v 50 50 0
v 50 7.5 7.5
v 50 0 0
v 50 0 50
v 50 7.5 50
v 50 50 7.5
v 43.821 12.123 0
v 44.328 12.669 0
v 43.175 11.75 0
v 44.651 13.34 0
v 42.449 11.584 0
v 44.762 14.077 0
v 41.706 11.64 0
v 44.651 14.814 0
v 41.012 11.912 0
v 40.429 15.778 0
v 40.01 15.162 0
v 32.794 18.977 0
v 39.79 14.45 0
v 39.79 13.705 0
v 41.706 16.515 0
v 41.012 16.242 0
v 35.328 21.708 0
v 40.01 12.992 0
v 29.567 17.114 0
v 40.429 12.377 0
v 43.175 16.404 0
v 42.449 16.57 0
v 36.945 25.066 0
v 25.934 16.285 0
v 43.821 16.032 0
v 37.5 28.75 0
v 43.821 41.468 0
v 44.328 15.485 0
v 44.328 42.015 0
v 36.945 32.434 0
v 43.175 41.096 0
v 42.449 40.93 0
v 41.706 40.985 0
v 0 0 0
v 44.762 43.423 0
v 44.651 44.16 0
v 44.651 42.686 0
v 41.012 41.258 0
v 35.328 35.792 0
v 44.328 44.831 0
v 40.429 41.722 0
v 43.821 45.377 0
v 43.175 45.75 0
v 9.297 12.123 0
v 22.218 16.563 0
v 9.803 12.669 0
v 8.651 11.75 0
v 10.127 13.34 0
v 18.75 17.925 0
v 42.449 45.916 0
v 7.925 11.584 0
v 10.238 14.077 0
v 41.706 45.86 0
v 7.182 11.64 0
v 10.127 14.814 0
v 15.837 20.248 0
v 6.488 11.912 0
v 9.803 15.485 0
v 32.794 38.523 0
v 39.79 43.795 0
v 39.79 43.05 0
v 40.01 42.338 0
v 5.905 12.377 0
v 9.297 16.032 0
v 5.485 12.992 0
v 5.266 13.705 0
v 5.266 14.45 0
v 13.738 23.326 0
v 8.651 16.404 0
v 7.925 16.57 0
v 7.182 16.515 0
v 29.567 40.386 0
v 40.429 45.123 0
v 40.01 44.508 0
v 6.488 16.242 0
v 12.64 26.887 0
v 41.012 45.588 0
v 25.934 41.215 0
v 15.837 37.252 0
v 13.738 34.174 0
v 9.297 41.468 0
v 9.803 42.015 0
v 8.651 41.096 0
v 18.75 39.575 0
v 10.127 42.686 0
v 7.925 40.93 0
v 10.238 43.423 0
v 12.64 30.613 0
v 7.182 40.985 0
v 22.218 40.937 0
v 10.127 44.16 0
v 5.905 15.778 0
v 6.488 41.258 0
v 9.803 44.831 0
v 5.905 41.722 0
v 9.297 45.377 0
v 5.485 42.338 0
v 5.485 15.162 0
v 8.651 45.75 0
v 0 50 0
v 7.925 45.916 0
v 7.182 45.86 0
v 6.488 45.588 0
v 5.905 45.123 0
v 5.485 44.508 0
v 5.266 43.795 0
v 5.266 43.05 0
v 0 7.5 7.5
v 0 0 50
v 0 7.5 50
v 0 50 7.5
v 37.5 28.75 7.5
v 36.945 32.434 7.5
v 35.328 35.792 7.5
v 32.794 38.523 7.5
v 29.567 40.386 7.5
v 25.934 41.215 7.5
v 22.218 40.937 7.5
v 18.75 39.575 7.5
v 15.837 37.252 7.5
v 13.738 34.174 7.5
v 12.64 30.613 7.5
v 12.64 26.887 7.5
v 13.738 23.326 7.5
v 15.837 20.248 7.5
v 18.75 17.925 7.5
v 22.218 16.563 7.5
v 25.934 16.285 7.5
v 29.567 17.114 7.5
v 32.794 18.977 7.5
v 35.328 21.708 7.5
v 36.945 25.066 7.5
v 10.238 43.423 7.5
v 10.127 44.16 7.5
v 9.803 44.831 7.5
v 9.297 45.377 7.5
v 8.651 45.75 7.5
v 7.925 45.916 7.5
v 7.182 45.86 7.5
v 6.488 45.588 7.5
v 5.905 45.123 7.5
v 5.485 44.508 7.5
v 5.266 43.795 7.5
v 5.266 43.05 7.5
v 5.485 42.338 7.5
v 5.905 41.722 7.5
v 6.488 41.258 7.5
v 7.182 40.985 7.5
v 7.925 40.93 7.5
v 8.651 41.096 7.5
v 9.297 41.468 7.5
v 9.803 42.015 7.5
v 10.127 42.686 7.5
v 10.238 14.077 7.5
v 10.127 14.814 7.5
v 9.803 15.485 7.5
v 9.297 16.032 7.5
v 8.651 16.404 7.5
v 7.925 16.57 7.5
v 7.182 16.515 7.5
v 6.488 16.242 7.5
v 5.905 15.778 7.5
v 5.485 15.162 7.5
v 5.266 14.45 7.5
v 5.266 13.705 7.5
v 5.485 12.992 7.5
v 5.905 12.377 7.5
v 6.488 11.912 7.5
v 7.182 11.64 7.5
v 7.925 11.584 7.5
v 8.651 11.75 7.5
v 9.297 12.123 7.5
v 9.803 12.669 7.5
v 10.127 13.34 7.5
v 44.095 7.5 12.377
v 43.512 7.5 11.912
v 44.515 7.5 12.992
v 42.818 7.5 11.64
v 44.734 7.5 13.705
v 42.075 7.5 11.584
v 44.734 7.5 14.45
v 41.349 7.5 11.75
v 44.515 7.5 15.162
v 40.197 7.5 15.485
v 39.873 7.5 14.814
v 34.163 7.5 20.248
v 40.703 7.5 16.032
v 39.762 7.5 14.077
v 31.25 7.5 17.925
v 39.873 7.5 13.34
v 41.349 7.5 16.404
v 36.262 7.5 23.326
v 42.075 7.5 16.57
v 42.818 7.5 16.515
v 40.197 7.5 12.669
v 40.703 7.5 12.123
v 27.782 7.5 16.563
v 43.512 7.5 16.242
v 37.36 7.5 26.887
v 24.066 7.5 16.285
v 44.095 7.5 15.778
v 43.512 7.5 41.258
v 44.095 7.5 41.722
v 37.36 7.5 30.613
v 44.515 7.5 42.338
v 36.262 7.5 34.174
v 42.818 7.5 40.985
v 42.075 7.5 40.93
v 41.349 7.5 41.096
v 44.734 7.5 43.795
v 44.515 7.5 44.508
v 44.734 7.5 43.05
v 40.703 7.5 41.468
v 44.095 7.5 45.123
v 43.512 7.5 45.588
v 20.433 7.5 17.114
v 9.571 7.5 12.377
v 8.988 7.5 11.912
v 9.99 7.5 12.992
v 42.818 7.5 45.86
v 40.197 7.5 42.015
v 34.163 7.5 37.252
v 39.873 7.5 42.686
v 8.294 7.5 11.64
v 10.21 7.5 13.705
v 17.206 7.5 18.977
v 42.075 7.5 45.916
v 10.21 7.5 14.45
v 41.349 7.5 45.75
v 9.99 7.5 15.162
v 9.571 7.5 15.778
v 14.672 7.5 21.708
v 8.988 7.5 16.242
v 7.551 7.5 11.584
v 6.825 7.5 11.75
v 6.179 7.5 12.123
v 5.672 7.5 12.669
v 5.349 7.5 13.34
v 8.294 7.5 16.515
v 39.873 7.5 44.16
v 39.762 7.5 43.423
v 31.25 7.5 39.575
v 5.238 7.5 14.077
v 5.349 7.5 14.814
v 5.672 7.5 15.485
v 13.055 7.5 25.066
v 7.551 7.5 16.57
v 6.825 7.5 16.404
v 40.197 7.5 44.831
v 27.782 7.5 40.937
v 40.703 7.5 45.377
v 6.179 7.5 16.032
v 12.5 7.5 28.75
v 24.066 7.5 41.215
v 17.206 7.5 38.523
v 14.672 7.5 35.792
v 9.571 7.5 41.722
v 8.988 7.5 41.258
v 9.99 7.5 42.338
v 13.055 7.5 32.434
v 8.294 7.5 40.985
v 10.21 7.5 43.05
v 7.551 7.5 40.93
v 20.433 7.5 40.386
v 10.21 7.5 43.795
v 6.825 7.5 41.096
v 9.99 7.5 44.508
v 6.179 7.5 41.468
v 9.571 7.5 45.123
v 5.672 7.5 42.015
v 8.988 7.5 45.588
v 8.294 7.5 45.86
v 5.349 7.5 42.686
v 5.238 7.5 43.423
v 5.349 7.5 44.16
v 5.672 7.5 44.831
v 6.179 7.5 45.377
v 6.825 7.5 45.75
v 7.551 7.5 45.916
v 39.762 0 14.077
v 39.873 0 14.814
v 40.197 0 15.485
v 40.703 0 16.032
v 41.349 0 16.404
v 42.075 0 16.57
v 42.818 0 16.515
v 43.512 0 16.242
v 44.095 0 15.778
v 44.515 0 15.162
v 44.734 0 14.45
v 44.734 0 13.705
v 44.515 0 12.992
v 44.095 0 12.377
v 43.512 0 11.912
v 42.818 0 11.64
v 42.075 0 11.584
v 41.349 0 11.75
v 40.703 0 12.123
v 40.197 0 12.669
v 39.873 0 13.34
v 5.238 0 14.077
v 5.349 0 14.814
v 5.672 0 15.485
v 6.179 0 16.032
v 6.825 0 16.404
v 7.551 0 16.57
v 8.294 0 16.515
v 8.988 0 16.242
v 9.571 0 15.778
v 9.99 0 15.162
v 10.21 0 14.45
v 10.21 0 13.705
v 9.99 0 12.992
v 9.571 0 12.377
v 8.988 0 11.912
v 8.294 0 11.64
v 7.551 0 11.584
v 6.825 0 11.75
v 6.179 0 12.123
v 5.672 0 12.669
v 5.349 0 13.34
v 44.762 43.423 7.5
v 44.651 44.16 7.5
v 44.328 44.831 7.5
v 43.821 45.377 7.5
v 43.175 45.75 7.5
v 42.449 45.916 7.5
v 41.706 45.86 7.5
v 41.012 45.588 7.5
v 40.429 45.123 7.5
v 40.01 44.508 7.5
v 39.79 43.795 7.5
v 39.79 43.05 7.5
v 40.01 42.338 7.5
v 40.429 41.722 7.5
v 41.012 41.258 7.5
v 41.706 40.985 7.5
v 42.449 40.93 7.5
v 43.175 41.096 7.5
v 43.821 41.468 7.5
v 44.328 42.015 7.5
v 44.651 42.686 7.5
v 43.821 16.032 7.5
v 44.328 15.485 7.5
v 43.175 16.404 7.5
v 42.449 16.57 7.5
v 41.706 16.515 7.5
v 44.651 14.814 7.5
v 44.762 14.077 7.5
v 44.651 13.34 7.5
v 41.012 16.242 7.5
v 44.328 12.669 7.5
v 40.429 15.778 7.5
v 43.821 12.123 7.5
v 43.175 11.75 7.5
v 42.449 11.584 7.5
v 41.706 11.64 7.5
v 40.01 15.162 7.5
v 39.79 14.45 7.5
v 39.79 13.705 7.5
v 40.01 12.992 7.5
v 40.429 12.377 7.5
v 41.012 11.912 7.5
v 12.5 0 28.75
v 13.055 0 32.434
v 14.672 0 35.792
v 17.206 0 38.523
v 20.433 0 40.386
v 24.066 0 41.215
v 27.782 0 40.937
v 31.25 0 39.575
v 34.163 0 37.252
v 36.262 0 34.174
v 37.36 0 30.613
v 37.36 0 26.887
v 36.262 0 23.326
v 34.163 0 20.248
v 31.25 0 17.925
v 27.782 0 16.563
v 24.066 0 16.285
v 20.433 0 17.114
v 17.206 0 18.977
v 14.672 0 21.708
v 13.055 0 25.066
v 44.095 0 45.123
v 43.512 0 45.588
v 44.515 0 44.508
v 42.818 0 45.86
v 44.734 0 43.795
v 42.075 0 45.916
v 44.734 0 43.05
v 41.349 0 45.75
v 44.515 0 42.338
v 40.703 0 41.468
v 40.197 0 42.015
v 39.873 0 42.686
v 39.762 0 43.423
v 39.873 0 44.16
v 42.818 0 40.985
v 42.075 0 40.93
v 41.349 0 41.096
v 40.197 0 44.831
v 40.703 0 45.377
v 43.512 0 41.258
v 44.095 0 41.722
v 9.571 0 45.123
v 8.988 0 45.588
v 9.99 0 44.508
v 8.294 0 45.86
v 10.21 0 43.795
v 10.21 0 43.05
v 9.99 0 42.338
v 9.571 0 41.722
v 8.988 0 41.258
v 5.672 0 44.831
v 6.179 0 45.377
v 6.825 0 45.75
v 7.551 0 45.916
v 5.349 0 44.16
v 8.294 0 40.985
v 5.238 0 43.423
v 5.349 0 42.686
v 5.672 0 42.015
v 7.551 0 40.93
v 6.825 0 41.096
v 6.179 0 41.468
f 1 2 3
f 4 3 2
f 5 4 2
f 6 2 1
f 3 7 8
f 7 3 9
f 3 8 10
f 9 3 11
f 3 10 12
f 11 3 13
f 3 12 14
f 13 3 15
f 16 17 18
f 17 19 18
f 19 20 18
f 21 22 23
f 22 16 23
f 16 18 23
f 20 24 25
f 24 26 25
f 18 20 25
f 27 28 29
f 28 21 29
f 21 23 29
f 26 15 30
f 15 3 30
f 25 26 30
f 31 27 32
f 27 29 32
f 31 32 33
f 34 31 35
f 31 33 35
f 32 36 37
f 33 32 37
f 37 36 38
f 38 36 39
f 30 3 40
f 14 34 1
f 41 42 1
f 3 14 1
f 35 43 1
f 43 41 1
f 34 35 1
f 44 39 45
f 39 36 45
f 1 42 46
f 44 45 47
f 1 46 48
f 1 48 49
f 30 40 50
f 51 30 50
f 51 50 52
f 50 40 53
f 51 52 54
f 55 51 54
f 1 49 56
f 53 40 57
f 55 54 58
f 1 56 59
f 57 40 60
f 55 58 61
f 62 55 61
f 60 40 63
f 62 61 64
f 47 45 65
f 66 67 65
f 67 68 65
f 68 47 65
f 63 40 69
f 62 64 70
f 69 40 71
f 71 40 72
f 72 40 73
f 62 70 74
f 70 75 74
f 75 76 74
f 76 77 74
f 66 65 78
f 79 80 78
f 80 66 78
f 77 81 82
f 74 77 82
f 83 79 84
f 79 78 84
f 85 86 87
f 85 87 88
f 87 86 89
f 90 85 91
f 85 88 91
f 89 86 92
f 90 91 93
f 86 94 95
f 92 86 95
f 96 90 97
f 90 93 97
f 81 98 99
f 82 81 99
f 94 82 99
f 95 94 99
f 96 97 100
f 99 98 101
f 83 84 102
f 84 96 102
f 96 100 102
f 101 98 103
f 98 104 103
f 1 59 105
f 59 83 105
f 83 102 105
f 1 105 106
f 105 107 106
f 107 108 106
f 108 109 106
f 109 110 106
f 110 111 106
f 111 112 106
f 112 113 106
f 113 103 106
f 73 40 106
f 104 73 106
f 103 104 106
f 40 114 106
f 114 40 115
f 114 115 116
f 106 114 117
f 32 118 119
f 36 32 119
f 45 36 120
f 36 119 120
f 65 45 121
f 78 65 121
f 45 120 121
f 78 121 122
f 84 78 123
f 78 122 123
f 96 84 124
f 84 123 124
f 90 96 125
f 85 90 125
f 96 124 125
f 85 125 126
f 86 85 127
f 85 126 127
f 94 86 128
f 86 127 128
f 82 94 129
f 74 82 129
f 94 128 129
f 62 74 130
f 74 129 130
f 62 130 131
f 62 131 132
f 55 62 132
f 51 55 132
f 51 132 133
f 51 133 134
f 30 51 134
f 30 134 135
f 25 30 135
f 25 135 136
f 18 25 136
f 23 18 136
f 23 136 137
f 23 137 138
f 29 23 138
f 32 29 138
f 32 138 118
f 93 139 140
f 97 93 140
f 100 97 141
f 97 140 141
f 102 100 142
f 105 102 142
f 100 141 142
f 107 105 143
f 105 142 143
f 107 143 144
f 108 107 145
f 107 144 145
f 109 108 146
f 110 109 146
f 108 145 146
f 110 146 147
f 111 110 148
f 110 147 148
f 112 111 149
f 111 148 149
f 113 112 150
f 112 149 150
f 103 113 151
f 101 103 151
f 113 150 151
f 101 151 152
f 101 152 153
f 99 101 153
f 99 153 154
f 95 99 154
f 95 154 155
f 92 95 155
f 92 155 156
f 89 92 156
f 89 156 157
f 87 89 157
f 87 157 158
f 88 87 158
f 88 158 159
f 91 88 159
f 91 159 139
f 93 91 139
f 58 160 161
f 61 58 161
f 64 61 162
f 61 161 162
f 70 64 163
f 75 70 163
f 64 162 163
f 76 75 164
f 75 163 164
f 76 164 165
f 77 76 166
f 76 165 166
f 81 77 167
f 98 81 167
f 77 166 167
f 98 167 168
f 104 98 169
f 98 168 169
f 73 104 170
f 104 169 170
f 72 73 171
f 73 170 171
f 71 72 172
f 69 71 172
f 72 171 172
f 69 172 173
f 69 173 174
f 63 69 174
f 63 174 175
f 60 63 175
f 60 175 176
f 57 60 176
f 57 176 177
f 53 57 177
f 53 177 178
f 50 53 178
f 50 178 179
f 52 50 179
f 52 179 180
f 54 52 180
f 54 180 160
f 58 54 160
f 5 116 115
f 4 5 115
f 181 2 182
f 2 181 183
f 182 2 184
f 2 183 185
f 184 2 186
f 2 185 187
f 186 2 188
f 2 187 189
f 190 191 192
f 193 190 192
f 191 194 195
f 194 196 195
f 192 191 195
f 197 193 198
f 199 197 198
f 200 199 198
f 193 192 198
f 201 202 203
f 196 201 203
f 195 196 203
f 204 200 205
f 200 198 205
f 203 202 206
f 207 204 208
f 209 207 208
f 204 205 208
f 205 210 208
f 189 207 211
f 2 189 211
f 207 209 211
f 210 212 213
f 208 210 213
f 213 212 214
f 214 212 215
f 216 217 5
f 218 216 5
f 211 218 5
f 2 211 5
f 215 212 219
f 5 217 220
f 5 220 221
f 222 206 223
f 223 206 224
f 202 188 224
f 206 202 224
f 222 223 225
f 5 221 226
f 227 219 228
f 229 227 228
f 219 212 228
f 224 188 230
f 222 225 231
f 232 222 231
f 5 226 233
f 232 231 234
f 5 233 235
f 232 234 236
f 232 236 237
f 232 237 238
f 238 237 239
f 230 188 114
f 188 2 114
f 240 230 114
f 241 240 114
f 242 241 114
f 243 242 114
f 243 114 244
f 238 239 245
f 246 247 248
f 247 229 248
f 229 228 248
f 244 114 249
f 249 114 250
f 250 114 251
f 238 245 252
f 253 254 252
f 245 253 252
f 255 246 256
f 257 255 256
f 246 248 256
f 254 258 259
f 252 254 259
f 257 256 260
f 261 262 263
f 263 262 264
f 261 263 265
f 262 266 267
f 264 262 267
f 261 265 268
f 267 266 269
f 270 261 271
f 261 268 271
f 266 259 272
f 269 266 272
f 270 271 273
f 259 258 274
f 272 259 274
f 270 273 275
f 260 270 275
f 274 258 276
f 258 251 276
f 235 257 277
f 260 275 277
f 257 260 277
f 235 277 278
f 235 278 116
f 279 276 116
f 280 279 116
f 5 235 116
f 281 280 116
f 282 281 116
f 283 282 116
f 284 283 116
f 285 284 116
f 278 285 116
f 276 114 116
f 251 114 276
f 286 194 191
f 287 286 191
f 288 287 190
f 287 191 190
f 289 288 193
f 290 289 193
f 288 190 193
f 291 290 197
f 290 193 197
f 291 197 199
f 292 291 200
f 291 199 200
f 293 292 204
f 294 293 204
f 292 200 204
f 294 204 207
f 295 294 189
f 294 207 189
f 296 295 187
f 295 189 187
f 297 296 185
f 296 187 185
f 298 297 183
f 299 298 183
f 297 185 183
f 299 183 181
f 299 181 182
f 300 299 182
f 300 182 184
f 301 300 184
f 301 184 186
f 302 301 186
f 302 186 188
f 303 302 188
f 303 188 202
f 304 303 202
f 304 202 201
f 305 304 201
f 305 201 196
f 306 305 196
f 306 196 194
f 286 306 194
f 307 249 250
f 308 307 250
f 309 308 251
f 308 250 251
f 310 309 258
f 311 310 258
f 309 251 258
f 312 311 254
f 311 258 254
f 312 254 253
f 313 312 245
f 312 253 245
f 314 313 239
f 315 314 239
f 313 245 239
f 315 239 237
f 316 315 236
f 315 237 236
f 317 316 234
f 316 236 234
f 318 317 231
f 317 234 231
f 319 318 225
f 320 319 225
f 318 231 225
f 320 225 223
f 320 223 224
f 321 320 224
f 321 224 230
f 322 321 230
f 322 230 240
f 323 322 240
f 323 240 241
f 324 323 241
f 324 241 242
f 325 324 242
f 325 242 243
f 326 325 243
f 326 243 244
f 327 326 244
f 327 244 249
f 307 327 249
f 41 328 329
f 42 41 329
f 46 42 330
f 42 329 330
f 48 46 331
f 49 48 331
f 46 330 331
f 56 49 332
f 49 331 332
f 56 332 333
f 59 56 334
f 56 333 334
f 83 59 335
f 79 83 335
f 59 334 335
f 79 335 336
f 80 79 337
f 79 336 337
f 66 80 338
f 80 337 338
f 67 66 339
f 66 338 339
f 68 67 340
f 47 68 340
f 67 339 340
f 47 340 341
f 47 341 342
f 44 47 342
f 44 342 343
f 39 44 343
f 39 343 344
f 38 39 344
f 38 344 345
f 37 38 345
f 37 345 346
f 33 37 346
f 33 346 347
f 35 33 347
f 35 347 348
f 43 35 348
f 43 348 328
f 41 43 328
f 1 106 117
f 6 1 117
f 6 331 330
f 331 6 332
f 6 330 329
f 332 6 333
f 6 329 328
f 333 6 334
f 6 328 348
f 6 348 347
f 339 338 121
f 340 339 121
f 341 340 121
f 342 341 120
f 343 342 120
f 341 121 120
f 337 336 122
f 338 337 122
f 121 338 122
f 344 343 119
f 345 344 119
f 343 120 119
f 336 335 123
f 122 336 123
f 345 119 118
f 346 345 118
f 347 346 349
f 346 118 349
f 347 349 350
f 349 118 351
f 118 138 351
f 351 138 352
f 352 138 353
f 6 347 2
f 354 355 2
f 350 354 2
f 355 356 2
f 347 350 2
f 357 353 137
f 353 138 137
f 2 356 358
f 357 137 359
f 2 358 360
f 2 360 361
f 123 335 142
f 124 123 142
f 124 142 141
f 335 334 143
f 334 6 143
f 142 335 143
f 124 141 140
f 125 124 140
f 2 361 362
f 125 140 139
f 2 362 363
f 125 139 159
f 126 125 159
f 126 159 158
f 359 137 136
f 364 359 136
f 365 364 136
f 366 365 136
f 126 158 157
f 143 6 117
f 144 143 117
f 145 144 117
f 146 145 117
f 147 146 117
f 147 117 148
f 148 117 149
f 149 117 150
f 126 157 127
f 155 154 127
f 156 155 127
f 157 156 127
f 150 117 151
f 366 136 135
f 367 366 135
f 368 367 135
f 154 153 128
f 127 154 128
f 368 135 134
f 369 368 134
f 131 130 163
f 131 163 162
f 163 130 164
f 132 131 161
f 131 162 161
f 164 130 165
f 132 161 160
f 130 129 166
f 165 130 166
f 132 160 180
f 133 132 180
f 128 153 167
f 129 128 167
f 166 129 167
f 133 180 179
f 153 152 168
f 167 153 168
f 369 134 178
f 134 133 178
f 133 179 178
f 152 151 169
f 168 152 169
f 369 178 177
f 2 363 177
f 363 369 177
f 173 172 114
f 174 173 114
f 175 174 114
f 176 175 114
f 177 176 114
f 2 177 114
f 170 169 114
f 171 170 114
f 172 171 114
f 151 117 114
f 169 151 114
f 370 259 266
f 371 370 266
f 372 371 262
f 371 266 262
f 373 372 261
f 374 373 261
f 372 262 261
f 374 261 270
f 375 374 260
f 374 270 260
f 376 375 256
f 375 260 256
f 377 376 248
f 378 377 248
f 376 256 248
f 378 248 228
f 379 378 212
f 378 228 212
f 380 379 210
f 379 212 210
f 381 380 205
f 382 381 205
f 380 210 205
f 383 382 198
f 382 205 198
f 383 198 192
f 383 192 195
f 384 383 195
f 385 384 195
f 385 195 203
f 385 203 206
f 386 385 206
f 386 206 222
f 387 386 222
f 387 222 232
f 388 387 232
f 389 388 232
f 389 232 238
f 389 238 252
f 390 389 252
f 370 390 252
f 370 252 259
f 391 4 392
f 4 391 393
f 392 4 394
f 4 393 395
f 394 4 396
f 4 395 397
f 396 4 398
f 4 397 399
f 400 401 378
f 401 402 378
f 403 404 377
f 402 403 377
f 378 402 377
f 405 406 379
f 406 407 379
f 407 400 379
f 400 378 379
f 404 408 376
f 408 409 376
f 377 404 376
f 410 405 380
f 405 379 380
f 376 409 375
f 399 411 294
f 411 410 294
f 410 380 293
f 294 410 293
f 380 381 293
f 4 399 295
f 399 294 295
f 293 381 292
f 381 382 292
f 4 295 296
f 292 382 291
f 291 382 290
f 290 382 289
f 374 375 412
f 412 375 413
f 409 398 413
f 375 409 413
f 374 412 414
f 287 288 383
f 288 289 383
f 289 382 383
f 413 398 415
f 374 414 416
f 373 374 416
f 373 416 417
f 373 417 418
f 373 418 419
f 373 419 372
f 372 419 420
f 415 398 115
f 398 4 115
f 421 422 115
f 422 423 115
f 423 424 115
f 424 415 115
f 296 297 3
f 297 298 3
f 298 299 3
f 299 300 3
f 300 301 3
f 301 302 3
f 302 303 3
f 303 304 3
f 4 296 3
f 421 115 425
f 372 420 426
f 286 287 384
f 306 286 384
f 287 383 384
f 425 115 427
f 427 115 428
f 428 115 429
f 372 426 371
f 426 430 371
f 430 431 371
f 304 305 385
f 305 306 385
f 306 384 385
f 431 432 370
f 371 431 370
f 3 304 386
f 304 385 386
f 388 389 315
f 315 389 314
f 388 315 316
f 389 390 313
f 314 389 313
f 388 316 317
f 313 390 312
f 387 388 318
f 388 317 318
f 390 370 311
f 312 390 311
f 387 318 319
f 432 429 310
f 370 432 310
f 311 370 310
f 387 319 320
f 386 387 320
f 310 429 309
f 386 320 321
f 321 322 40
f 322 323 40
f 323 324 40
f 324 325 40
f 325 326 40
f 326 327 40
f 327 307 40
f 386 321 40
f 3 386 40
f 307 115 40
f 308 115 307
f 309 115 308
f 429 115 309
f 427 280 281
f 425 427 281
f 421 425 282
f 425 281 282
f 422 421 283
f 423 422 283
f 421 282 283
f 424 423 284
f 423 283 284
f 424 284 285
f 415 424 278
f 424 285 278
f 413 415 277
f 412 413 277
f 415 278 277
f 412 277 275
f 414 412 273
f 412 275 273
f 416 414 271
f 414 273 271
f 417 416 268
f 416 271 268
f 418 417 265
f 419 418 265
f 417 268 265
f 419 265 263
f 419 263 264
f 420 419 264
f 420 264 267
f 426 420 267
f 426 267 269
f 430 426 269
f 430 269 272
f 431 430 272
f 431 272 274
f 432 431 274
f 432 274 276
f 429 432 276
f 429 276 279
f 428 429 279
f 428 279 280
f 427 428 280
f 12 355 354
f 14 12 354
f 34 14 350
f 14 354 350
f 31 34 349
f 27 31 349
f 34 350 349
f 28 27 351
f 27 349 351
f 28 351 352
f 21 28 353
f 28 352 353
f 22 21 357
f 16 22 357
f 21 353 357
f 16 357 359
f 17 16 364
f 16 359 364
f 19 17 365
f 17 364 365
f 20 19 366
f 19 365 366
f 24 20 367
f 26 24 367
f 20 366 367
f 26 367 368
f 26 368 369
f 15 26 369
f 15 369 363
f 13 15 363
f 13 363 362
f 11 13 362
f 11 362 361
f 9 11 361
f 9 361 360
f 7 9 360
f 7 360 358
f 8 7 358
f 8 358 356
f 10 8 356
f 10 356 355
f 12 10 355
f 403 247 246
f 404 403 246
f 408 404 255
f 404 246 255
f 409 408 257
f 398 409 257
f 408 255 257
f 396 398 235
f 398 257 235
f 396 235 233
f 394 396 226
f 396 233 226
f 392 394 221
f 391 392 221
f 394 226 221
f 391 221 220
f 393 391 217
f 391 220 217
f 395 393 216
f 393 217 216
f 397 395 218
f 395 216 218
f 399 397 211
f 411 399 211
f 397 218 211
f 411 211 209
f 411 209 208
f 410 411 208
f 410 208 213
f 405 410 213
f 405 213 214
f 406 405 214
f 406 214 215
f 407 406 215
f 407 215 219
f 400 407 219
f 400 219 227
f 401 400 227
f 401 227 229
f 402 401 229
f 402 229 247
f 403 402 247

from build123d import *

# Parameters (mm, degrees)
F1_DEPTH = 50
F2_R     = 12.5
F2_R_2   = 2.5
F3_DEPTH = 7.501
F4_R     = 12.5
F4_R_2   = 2.5
F5_DEPTH = 7.501


with BuildPart() as f1:
    # F0 (on Right) → F1 (new body)
    with BuildSketch(Plane.YZ):
        Polygon((7.5, 50), (0, 50), (0, 0), (50, 0), (50, 7.5), (7.5, 7.5), align=None)
    extrude(amount=F1_DEPTH)

    # F2 (on face) → F3 (cut, through all)
    with BuildSketch(Plane(origin=(0, 7.5, 0), x_dir=(-1, 0, 0), z_dir=(0, 1, 0))):
        with Locations((-25, 28.75)):
            Circle(F2_R)
        with Locations((-42.262121, 43.422803)):
            Circle(F2_R_2)
        with Locations((-7.737879, 43.422803)):
            Circle(F2_R_2)
        with Locations((-7.737879, 14.077197)):
            Circle(F2_R_2)
        with Locations((-42.262121, 14.077197)):
            Circle(F2_R_2)
    extrude(amount=-F3_DEPTH, mode=Mode.SUBTRACT)

    # F4 (on face) → F5 (cut, through all)
    with BuildSketch(Plane.XY.offset(7.5)):
        with Locations((25, 28.75)):
            Circle(F4_R)
        with Locations((7.737879, 43.422803)):
            Circle(F4_R_2)
        with Locations((42.262121, 43.422803)):
            Circle(F4_R_2)
        with Locations((42.262121, 14.077197)):
            Circle(F4_R_2)
        with Locations((7.737879, 14.077197)):
            Circle(F4_R_2)
    extrude(amount=-F5_DEPTH, mode=Mode.SUBTRACT)


solid = f1.part
